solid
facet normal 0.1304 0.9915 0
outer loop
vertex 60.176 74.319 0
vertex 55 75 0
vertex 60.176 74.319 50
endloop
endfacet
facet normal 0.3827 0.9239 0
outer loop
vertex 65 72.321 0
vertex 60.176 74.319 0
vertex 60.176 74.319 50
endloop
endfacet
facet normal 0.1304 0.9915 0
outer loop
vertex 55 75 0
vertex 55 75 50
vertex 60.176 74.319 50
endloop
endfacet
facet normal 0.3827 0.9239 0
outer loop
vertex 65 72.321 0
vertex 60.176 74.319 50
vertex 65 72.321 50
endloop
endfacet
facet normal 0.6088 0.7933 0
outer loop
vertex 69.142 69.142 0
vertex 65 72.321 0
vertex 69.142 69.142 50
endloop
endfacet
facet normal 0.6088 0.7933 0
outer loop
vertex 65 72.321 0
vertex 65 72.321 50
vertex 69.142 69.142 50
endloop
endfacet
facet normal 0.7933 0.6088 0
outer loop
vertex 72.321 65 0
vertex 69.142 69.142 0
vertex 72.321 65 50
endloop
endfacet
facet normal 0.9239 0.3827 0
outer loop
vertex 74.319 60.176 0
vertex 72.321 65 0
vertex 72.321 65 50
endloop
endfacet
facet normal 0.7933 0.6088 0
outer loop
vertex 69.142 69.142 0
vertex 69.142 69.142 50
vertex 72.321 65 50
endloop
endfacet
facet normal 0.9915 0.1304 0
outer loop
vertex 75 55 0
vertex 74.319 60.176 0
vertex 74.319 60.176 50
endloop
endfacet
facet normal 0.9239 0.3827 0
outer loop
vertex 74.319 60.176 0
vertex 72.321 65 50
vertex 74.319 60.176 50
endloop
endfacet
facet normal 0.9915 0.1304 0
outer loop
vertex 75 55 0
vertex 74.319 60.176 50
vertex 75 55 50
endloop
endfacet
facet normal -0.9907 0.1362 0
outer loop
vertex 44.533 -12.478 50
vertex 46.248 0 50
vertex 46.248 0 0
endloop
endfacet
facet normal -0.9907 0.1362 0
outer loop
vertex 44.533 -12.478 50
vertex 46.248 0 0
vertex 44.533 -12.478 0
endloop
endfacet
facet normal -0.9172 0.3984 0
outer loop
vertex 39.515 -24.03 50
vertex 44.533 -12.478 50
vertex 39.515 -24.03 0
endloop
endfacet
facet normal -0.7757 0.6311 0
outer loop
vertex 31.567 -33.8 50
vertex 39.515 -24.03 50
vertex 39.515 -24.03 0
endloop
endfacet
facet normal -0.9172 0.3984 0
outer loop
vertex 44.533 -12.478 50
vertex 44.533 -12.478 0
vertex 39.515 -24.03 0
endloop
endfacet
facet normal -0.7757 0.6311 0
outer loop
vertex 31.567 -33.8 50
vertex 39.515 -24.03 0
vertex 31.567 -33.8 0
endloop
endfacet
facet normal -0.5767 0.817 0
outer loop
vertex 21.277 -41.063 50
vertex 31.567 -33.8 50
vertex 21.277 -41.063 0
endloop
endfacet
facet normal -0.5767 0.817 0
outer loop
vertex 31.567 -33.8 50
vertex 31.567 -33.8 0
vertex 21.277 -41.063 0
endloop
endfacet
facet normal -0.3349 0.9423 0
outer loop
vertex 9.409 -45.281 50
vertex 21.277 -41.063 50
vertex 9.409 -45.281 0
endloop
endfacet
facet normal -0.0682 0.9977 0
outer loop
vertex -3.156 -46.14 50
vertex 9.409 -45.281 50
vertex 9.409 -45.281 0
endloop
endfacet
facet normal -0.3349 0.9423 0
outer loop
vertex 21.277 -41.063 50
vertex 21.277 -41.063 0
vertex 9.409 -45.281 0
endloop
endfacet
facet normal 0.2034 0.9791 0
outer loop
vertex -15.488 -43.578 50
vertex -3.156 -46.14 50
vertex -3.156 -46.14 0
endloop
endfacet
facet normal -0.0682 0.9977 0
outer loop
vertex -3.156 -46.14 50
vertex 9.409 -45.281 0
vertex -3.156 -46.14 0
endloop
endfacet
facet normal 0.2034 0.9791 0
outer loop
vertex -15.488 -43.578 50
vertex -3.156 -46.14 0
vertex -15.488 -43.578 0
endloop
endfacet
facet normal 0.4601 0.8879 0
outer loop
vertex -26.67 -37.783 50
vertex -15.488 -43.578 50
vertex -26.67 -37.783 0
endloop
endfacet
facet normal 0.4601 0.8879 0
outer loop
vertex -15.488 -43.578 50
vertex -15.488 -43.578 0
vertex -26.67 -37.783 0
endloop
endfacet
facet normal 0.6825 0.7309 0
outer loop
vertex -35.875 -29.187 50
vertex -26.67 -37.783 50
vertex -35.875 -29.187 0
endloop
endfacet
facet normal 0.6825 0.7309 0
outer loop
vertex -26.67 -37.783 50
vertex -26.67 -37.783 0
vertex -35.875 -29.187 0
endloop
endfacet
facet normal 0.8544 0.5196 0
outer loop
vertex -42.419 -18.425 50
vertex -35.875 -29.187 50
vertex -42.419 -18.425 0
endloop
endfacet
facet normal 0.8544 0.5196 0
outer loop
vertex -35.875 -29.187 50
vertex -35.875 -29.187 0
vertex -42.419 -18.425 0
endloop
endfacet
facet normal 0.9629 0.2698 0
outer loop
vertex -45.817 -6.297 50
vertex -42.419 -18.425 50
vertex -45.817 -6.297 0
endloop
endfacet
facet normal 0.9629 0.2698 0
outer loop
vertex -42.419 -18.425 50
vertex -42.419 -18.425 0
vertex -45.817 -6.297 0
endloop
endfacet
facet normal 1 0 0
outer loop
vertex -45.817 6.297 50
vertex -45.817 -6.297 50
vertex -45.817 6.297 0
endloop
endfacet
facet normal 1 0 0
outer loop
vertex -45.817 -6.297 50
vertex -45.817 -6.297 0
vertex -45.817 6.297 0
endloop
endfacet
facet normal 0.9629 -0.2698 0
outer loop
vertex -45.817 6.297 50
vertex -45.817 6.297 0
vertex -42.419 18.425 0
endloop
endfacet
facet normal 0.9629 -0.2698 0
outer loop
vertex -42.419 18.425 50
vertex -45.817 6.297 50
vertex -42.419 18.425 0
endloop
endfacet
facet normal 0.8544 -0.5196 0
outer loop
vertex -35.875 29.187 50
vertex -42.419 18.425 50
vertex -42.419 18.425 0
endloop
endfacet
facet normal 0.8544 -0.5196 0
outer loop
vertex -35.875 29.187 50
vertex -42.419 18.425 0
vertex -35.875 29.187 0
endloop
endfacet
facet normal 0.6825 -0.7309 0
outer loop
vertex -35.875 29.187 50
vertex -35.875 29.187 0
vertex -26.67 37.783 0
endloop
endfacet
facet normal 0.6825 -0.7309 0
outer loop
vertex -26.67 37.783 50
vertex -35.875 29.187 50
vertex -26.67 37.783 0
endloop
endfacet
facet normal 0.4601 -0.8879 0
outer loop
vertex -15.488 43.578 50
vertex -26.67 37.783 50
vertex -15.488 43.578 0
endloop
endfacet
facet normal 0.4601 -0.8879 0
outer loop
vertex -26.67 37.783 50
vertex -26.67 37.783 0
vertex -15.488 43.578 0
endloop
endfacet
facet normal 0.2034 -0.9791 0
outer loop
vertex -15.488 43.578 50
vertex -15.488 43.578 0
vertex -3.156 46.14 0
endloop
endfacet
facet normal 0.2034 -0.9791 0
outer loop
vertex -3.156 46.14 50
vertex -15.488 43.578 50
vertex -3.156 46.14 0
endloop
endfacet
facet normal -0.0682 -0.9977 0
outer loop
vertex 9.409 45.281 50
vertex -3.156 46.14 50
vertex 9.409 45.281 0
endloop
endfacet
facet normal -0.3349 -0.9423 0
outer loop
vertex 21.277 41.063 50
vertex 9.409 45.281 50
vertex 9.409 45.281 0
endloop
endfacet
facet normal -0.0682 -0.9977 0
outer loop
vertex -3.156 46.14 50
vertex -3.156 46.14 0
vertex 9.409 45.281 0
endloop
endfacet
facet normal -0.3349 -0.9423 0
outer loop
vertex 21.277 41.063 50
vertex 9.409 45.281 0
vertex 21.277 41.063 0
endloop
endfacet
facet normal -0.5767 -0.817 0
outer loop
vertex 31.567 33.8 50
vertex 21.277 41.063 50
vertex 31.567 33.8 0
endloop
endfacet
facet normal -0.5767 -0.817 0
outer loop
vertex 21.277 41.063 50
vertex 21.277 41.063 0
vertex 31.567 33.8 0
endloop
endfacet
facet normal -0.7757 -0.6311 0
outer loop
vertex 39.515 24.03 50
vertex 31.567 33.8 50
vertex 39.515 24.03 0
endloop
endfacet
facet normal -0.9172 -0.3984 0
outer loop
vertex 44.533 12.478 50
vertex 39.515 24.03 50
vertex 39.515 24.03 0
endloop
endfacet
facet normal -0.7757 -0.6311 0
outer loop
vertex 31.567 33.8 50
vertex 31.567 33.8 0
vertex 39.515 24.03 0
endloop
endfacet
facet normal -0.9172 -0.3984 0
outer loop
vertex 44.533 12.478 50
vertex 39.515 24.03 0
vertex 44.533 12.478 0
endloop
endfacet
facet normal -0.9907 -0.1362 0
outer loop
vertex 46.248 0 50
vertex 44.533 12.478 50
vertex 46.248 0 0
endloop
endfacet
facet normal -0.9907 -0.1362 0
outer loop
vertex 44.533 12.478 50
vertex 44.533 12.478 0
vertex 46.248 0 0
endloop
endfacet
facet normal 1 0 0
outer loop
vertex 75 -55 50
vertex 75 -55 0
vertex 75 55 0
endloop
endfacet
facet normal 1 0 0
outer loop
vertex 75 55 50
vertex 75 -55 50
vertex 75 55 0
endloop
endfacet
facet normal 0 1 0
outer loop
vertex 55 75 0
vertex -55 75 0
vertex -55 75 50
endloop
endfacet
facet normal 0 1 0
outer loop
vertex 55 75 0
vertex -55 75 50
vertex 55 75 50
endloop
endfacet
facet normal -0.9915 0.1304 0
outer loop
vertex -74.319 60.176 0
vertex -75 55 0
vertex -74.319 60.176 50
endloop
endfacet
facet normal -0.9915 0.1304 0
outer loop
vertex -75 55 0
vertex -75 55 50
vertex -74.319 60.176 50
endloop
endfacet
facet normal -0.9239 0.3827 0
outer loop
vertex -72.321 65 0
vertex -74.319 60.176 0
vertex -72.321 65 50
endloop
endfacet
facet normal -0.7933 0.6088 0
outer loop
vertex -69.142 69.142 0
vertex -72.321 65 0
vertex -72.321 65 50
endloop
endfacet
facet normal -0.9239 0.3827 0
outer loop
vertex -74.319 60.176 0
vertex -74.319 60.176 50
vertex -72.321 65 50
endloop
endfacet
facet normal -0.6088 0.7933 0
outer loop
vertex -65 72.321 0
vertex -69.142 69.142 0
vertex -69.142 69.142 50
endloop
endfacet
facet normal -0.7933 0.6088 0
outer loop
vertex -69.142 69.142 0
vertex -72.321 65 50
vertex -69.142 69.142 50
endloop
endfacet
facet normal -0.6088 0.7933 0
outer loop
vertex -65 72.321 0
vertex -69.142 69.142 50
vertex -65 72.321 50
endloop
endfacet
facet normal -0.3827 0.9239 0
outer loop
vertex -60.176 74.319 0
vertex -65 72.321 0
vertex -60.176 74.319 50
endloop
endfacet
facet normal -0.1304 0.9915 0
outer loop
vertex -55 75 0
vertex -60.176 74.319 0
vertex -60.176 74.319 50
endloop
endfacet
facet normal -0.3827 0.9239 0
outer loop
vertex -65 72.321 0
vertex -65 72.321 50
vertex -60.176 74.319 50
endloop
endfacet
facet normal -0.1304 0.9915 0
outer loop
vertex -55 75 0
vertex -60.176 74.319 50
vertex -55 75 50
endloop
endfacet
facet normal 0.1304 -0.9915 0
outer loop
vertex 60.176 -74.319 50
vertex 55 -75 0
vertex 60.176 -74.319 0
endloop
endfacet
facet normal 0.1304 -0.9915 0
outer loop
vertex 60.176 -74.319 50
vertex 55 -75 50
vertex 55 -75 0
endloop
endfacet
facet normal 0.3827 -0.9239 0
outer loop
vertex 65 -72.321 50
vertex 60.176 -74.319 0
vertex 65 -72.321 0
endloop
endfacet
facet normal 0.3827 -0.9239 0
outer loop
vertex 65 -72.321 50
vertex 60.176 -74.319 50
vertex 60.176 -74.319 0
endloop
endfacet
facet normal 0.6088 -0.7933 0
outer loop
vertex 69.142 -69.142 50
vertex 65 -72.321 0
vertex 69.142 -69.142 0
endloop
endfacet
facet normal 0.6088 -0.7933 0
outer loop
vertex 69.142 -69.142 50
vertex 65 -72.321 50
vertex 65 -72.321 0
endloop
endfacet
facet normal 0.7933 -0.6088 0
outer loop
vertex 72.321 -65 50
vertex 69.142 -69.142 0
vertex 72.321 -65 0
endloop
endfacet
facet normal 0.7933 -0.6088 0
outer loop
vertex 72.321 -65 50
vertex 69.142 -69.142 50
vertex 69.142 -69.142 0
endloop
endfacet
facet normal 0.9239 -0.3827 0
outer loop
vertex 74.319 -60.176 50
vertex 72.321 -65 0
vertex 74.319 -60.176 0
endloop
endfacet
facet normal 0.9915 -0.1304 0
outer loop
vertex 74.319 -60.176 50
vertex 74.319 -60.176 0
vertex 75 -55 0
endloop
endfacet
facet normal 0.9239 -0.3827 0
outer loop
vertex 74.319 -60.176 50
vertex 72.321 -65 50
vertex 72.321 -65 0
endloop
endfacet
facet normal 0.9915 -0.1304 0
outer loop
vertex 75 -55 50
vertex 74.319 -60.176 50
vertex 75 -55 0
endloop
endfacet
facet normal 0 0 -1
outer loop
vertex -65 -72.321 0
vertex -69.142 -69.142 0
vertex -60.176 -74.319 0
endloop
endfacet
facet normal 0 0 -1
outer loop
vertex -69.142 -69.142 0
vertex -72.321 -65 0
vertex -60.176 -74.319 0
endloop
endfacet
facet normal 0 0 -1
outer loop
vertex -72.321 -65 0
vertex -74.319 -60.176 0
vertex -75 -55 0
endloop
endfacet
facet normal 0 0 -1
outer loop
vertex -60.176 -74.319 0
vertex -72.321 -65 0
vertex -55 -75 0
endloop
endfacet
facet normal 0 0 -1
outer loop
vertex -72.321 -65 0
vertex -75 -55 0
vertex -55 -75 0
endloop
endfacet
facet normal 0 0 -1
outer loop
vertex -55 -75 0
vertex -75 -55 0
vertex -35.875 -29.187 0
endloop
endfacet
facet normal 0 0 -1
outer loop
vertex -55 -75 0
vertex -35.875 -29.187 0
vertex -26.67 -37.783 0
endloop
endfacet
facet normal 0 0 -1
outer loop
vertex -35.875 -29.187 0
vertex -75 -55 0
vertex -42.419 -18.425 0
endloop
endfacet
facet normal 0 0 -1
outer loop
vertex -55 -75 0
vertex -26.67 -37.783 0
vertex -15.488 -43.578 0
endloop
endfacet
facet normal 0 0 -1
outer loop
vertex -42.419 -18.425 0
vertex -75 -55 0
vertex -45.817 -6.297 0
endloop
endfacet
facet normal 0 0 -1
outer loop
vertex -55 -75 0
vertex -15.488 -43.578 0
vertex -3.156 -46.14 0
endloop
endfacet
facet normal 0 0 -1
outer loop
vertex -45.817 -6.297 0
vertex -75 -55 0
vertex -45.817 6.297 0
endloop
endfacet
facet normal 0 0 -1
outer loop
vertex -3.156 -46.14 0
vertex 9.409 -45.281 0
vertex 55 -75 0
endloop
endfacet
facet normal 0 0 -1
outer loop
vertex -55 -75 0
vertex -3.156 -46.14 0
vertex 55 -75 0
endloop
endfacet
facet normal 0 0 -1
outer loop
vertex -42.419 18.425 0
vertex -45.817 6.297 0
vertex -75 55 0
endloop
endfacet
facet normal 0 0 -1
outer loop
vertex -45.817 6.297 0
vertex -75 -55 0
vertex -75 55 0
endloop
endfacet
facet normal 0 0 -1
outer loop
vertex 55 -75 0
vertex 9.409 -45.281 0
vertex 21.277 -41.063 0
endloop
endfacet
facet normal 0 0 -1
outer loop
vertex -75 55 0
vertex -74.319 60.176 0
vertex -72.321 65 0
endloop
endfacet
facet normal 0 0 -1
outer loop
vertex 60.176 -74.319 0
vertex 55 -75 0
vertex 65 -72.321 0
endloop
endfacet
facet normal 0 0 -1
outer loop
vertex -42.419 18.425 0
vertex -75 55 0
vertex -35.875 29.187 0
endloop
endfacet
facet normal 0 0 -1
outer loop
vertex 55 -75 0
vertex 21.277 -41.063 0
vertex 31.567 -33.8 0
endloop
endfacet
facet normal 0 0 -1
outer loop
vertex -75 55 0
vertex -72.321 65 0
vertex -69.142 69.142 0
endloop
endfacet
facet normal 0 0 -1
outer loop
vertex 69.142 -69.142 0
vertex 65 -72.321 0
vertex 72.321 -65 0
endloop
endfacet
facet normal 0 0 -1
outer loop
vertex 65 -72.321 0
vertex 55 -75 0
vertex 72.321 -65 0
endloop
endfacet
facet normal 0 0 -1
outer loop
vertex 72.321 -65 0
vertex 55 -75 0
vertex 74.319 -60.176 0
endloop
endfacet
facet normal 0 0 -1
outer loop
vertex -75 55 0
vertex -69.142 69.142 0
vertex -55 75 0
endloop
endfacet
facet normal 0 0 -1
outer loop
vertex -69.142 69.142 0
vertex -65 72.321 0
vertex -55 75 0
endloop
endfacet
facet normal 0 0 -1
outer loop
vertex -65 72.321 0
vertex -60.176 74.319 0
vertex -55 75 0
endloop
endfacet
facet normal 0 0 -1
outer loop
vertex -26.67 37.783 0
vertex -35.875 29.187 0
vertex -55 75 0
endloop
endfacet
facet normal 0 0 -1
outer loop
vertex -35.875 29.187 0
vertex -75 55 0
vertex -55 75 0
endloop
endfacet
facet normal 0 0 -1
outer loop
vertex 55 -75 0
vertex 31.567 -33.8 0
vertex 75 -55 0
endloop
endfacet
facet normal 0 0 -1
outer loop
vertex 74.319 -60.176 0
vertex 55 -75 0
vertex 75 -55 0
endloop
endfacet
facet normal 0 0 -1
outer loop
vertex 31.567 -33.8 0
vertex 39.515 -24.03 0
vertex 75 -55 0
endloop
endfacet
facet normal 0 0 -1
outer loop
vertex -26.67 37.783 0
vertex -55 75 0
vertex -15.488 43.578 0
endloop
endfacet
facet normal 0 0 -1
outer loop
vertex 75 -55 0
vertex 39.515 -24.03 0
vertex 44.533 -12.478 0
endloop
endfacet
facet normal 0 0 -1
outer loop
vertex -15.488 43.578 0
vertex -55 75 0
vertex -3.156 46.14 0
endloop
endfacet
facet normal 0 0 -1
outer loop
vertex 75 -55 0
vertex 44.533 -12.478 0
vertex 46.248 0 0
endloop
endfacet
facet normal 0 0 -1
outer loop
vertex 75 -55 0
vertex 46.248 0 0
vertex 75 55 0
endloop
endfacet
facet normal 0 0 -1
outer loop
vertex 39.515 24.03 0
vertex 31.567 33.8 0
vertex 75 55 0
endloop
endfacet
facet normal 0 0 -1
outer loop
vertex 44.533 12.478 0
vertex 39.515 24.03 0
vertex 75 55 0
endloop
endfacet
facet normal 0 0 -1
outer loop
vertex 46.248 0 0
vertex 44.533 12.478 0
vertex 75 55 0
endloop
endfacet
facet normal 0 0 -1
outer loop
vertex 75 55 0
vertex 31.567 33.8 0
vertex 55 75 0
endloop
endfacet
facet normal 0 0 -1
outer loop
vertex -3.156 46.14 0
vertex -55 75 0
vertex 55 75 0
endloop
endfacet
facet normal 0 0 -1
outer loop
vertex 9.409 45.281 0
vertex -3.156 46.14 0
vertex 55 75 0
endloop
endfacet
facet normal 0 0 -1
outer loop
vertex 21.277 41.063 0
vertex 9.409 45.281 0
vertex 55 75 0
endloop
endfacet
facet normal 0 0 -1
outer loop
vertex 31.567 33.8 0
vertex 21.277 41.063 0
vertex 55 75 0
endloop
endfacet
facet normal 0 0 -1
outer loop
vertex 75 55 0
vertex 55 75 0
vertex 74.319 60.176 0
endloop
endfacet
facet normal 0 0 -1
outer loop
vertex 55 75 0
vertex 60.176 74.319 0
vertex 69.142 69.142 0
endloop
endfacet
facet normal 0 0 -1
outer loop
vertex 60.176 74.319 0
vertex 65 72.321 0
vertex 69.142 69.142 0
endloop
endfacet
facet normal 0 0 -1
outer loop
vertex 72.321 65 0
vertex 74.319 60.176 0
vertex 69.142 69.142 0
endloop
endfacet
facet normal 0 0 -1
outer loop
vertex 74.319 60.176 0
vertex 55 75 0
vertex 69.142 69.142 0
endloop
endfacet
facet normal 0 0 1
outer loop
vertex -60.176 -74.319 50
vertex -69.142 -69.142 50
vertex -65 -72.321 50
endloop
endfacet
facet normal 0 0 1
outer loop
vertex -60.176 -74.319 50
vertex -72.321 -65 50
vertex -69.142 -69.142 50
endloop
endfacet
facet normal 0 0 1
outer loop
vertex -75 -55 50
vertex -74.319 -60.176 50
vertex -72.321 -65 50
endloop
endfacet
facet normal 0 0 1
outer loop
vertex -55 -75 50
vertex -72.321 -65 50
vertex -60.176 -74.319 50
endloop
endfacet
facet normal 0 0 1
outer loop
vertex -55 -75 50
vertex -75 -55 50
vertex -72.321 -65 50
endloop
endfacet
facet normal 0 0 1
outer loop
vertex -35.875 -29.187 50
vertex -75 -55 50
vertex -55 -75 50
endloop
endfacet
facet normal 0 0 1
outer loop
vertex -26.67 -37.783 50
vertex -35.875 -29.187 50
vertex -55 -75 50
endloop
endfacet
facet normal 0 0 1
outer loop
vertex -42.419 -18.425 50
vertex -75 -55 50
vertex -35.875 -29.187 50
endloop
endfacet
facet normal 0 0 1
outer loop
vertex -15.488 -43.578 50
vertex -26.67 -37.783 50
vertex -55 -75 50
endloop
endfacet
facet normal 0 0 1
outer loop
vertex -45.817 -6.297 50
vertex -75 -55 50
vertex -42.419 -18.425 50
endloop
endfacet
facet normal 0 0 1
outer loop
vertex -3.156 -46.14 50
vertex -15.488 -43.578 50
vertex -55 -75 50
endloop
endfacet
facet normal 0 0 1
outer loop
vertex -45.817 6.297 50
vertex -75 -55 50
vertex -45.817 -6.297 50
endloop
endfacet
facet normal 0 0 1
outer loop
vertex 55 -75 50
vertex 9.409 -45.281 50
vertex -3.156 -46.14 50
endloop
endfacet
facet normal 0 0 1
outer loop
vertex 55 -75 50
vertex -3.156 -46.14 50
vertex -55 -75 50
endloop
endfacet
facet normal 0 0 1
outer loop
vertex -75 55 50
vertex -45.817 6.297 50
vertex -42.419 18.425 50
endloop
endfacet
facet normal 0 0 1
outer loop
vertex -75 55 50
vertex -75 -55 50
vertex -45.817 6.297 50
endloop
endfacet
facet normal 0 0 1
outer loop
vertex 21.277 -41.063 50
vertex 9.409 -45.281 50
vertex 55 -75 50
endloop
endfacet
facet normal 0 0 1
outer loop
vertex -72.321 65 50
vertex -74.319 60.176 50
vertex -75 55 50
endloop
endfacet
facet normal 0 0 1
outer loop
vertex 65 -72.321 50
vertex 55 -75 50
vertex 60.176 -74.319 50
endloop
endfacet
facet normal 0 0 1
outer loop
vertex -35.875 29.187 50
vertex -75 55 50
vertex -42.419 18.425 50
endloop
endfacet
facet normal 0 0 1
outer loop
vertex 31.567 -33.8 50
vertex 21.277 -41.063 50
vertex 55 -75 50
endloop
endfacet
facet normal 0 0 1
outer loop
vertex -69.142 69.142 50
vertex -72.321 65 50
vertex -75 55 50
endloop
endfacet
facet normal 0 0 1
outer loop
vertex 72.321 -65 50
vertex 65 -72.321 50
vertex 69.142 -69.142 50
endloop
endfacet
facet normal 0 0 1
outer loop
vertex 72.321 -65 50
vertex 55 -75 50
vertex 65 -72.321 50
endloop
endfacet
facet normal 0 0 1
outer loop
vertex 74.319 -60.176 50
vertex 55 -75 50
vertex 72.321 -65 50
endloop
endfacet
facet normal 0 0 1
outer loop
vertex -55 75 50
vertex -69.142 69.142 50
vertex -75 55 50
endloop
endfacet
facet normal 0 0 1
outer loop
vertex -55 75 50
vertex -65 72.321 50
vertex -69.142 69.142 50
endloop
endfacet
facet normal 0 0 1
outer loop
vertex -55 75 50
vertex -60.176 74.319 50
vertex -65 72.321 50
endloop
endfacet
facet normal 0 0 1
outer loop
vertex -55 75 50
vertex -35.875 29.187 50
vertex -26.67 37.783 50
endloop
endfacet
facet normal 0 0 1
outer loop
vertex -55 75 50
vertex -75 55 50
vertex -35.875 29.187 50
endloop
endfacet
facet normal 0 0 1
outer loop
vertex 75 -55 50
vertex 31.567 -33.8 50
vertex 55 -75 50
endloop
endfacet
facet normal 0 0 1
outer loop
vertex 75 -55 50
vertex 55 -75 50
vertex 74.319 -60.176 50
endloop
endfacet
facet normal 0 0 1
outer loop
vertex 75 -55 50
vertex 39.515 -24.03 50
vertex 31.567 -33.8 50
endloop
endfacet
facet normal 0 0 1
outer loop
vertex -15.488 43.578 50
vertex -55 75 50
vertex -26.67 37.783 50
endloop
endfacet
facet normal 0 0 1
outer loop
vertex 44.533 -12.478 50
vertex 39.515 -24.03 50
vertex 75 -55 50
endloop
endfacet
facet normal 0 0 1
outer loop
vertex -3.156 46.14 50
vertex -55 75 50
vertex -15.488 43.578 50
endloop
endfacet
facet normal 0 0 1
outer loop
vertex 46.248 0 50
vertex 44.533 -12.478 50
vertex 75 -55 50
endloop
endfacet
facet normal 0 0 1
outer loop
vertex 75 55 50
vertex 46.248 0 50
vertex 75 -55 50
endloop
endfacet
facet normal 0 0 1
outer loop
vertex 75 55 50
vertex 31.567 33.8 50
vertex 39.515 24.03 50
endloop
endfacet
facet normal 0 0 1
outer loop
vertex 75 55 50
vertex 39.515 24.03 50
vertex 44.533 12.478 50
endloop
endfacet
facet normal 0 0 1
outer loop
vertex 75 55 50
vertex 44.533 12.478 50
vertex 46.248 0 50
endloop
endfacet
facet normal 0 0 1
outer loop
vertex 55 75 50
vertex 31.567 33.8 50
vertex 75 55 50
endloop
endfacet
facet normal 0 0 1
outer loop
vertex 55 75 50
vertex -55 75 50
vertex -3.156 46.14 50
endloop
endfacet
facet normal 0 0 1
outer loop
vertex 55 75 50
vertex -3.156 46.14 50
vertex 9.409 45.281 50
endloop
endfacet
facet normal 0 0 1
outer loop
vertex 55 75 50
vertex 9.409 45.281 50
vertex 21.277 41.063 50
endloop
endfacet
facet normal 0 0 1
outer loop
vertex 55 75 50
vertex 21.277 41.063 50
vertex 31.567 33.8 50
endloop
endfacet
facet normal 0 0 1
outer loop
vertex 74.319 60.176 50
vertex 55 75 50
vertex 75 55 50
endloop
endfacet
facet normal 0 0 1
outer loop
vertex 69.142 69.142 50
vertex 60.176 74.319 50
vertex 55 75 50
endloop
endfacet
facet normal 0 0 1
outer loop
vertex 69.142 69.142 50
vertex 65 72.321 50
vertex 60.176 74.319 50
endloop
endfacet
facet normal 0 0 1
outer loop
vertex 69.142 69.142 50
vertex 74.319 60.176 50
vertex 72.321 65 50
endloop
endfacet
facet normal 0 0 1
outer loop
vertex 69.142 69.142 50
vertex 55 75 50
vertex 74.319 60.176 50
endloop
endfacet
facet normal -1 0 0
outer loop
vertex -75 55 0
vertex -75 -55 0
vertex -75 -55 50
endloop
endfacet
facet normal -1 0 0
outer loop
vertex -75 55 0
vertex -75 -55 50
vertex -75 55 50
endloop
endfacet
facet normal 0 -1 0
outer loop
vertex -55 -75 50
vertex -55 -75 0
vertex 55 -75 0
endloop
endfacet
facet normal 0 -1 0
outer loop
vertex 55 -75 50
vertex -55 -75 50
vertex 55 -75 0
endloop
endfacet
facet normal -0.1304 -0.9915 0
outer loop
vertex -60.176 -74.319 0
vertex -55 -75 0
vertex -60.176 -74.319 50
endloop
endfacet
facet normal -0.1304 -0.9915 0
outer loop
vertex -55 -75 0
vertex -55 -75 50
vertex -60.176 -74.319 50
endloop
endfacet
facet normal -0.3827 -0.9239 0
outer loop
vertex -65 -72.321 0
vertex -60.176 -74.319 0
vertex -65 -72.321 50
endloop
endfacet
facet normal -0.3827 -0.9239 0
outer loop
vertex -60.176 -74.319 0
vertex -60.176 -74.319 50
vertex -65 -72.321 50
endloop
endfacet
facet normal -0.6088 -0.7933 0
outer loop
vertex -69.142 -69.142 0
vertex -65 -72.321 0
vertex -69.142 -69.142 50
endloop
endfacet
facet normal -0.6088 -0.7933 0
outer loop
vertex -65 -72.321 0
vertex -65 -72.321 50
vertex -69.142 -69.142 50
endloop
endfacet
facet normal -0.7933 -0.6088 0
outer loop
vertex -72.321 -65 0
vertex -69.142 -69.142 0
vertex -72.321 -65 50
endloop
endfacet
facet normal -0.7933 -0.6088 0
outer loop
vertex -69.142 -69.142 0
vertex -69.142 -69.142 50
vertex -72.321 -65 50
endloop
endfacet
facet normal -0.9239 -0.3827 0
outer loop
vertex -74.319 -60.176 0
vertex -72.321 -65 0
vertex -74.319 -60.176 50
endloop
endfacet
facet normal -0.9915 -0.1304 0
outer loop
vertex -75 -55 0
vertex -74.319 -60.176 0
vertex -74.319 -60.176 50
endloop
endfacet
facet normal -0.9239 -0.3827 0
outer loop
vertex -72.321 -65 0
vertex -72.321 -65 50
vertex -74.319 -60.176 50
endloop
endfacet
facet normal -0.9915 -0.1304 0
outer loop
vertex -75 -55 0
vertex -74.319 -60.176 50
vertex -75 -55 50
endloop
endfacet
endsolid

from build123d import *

# Parameters (mm, degrees)
F0_W     = 150
F0_H     = 150
F1_DEPTH = 50
F2_R     = 46.248065
F3_DEPTH = 50
F4_R     = 20
F5_R     = 20
F6_R     = 20


with BuildPart() as f1:
    # F0 (on Top) → F1 (new body)
    with BuildSketch(Plane.XY):
        Rectangle(F0_W, F0_H)
    extrude(amount=F1_DEPTH)

    # F2 (on face) → F3 (cut)
    with BuildSketch(Plane(origin=(0, 0, 0), x_dir=(1, 0, 0), z_dir=(0, 0, -1))):
        Circle(F2_R)
    extrude(amount=-F3_DEPTH, mode=Mode.SUBTRACT)

    # F4
    f4_edges = [f1.edges().sort_by_distance(p)[0] for p in [
        (75, -75, 25),
        (75, 75, 25),
    ]]
    fillet(f4_edges, radius=F4_R)

    # F5
    f5_edges = [f1.edges().sort_by_distance(p)[0] for p in [
        (-75, -75, 25),
    ]]
    fillet(f5_edges, radius=F5_R)

    # F6
    f6_edges = [f1.edges().sort_by_distance(p)[0] for p in [
        (-75, 75, 25),
    ]]
    fillet(f6_edges, radius=F6_R)


solid = f1.part
